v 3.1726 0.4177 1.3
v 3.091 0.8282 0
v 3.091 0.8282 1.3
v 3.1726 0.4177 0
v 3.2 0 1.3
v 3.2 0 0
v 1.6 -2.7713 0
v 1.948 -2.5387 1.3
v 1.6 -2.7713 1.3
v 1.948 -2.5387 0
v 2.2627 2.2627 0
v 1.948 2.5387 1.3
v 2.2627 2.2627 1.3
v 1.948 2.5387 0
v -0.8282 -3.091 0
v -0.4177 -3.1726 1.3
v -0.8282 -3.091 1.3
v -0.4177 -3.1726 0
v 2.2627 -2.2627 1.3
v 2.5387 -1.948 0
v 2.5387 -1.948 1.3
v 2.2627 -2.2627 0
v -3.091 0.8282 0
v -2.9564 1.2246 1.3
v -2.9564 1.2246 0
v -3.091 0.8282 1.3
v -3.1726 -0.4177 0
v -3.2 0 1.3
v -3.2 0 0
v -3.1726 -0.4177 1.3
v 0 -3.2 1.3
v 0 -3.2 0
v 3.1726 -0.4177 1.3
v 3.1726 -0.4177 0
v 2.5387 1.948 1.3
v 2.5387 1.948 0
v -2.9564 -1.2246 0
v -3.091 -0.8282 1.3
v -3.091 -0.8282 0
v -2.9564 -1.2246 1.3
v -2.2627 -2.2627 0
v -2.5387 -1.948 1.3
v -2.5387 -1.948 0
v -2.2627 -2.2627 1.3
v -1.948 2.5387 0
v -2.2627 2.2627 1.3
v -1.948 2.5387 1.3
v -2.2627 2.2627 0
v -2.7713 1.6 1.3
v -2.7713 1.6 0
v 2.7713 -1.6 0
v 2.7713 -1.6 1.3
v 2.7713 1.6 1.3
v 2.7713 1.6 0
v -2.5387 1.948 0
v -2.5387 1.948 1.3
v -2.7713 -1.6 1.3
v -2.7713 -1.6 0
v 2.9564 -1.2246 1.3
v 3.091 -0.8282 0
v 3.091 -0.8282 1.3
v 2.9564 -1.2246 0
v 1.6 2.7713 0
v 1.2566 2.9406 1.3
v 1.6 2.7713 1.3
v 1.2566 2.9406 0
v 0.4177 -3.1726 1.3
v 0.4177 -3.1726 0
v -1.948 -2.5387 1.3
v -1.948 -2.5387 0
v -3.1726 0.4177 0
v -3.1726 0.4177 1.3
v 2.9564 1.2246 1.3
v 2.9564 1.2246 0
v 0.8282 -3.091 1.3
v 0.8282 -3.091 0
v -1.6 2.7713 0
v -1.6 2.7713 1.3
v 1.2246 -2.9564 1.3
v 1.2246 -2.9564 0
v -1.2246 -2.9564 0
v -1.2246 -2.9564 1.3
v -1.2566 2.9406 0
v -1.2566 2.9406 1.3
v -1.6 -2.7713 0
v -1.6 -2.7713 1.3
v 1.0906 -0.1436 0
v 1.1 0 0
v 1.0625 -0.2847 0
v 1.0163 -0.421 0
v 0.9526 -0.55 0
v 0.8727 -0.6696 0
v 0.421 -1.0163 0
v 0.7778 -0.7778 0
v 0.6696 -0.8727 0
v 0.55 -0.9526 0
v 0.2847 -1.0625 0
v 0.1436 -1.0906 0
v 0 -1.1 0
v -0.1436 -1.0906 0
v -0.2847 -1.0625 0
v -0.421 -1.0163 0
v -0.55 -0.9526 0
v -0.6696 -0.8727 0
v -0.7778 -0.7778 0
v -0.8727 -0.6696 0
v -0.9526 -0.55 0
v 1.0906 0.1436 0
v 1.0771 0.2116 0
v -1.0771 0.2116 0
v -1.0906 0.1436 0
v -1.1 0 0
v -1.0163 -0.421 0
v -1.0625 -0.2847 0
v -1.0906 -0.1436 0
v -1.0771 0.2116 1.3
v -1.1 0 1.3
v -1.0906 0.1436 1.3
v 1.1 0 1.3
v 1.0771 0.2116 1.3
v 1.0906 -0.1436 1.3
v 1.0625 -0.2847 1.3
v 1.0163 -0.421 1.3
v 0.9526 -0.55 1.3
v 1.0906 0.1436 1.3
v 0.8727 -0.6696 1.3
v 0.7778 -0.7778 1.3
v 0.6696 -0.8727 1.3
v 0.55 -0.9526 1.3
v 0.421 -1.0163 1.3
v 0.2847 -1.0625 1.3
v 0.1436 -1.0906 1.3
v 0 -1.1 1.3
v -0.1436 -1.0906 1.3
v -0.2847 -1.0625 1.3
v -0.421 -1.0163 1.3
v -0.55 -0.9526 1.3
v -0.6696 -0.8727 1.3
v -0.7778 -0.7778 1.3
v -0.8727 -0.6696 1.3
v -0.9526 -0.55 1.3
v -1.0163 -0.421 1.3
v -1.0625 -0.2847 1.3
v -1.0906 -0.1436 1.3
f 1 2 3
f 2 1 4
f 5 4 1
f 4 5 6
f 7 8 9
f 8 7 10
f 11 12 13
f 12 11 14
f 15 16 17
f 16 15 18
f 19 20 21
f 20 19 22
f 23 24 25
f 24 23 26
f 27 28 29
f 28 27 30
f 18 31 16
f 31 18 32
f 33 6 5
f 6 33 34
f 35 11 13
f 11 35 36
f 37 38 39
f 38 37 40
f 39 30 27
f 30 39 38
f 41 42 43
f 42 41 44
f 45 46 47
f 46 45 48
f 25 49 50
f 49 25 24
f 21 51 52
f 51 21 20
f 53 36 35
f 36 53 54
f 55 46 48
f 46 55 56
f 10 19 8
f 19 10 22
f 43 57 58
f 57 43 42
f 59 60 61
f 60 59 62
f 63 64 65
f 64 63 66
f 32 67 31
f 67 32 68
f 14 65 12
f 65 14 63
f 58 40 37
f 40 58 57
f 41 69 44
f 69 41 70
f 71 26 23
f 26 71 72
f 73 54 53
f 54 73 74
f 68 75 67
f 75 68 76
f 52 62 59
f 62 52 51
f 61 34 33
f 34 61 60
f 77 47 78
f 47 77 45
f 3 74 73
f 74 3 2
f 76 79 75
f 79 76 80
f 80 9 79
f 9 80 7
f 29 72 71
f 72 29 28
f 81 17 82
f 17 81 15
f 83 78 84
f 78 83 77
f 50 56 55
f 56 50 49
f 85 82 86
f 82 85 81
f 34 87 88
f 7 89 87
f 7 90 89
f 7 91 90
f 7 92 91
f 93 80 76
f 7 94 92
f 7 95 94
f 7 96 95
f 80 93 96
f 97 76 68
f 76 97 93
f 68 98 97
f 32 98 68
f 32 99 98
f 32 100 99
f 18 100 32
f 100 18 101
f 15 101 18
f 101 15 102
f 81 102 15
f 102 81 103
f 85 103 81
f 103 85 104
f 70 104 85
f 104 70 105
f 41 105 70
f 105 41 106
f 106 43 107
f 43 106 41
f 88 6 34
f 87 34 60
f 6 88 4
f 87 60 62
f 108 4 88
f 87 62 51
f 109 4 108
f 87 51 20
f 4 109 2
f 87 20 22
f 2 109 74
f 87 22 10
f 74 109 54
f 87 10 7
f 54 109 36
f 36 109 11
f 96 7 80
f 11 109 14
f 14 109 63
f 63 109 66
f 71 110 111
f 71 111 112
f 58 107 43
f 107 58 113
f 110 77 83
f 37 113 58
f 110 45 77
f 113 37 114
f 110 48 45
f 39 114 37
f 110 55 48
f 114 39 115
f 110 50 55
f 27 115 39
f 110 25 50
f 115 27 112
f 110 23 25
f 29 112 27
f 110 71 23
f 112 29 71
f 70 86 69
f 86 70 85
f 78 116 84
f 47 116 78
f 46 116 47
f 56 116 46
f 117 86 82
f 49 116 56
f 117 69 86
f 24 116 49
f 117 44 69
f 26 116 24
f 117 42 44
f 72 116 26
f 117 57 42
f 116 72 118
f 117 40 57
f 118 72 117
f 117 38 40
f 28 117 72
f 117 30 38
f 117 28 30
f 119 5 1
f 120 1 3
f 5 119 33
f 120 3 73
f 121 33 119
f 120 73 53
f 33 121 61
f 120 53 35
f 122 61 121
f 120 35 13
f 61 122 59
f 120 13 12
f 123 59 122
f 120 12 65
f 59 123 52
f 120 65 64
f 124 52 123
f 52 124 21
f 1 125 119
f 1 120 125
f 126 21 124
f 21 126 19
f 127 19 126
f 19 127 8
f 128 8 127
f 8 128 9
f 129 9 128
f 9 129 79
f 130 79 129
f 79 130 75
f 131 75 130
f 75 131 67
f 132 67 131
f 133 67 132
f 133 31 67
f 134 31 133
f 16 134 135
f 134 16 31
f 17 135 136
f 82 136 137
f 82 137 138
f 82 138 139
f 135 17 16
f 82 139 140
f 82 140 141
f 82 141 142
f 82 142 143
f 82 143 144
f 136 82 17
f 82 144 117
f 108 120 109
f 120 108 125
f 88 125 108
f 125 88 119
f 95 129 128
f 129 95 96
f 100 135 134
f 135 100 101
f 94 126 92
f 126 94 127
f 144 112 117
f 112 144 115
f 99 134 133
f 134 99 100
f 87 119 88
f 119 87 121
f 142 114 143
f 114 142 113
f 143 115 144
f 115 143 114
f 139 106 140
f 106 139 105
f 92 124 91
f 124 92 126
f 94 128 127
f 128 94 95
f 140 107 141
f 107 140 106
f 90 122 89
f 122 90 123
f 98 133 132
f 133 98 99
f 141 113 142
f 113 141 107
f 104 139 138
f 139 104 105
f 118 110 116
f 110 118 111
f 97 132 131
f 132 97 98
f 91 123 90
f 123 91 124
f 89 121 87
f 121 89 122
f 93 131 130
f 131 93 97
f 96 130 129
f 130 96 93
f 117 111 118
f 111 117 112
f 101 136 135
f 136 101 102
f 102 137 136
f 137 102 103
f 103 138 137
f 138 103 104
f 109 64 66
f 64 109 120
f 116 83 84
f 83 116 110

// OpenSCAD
$fn=48;

module tight_c_clip(outer_d, inner_d, t, throat_w, entry_w) {
    outer_r = outer_d/2;
    inner_r = inner_d/2;
    difference() {
        difference() {
            cylinder(r=outer_r,h=t);
            translate([0,0,-0.1]) cylinder(r=inner_r,h=t+0.2);
        }
        linear_extrude(height=t+0.4)
            polygon(points=[
                [-throat_w/2,-0.2],
                [ throat_w/2,-0.2],
                [ entry_w/2,outer_r+0.4],
                [-entry_w/2,outer_r+0.4]
            ]);
    }
}

tight_c_clip(outer_d=6.40,inner_d=2.20,t=1.30,throat_w=2.10,entry_w=2.60);
